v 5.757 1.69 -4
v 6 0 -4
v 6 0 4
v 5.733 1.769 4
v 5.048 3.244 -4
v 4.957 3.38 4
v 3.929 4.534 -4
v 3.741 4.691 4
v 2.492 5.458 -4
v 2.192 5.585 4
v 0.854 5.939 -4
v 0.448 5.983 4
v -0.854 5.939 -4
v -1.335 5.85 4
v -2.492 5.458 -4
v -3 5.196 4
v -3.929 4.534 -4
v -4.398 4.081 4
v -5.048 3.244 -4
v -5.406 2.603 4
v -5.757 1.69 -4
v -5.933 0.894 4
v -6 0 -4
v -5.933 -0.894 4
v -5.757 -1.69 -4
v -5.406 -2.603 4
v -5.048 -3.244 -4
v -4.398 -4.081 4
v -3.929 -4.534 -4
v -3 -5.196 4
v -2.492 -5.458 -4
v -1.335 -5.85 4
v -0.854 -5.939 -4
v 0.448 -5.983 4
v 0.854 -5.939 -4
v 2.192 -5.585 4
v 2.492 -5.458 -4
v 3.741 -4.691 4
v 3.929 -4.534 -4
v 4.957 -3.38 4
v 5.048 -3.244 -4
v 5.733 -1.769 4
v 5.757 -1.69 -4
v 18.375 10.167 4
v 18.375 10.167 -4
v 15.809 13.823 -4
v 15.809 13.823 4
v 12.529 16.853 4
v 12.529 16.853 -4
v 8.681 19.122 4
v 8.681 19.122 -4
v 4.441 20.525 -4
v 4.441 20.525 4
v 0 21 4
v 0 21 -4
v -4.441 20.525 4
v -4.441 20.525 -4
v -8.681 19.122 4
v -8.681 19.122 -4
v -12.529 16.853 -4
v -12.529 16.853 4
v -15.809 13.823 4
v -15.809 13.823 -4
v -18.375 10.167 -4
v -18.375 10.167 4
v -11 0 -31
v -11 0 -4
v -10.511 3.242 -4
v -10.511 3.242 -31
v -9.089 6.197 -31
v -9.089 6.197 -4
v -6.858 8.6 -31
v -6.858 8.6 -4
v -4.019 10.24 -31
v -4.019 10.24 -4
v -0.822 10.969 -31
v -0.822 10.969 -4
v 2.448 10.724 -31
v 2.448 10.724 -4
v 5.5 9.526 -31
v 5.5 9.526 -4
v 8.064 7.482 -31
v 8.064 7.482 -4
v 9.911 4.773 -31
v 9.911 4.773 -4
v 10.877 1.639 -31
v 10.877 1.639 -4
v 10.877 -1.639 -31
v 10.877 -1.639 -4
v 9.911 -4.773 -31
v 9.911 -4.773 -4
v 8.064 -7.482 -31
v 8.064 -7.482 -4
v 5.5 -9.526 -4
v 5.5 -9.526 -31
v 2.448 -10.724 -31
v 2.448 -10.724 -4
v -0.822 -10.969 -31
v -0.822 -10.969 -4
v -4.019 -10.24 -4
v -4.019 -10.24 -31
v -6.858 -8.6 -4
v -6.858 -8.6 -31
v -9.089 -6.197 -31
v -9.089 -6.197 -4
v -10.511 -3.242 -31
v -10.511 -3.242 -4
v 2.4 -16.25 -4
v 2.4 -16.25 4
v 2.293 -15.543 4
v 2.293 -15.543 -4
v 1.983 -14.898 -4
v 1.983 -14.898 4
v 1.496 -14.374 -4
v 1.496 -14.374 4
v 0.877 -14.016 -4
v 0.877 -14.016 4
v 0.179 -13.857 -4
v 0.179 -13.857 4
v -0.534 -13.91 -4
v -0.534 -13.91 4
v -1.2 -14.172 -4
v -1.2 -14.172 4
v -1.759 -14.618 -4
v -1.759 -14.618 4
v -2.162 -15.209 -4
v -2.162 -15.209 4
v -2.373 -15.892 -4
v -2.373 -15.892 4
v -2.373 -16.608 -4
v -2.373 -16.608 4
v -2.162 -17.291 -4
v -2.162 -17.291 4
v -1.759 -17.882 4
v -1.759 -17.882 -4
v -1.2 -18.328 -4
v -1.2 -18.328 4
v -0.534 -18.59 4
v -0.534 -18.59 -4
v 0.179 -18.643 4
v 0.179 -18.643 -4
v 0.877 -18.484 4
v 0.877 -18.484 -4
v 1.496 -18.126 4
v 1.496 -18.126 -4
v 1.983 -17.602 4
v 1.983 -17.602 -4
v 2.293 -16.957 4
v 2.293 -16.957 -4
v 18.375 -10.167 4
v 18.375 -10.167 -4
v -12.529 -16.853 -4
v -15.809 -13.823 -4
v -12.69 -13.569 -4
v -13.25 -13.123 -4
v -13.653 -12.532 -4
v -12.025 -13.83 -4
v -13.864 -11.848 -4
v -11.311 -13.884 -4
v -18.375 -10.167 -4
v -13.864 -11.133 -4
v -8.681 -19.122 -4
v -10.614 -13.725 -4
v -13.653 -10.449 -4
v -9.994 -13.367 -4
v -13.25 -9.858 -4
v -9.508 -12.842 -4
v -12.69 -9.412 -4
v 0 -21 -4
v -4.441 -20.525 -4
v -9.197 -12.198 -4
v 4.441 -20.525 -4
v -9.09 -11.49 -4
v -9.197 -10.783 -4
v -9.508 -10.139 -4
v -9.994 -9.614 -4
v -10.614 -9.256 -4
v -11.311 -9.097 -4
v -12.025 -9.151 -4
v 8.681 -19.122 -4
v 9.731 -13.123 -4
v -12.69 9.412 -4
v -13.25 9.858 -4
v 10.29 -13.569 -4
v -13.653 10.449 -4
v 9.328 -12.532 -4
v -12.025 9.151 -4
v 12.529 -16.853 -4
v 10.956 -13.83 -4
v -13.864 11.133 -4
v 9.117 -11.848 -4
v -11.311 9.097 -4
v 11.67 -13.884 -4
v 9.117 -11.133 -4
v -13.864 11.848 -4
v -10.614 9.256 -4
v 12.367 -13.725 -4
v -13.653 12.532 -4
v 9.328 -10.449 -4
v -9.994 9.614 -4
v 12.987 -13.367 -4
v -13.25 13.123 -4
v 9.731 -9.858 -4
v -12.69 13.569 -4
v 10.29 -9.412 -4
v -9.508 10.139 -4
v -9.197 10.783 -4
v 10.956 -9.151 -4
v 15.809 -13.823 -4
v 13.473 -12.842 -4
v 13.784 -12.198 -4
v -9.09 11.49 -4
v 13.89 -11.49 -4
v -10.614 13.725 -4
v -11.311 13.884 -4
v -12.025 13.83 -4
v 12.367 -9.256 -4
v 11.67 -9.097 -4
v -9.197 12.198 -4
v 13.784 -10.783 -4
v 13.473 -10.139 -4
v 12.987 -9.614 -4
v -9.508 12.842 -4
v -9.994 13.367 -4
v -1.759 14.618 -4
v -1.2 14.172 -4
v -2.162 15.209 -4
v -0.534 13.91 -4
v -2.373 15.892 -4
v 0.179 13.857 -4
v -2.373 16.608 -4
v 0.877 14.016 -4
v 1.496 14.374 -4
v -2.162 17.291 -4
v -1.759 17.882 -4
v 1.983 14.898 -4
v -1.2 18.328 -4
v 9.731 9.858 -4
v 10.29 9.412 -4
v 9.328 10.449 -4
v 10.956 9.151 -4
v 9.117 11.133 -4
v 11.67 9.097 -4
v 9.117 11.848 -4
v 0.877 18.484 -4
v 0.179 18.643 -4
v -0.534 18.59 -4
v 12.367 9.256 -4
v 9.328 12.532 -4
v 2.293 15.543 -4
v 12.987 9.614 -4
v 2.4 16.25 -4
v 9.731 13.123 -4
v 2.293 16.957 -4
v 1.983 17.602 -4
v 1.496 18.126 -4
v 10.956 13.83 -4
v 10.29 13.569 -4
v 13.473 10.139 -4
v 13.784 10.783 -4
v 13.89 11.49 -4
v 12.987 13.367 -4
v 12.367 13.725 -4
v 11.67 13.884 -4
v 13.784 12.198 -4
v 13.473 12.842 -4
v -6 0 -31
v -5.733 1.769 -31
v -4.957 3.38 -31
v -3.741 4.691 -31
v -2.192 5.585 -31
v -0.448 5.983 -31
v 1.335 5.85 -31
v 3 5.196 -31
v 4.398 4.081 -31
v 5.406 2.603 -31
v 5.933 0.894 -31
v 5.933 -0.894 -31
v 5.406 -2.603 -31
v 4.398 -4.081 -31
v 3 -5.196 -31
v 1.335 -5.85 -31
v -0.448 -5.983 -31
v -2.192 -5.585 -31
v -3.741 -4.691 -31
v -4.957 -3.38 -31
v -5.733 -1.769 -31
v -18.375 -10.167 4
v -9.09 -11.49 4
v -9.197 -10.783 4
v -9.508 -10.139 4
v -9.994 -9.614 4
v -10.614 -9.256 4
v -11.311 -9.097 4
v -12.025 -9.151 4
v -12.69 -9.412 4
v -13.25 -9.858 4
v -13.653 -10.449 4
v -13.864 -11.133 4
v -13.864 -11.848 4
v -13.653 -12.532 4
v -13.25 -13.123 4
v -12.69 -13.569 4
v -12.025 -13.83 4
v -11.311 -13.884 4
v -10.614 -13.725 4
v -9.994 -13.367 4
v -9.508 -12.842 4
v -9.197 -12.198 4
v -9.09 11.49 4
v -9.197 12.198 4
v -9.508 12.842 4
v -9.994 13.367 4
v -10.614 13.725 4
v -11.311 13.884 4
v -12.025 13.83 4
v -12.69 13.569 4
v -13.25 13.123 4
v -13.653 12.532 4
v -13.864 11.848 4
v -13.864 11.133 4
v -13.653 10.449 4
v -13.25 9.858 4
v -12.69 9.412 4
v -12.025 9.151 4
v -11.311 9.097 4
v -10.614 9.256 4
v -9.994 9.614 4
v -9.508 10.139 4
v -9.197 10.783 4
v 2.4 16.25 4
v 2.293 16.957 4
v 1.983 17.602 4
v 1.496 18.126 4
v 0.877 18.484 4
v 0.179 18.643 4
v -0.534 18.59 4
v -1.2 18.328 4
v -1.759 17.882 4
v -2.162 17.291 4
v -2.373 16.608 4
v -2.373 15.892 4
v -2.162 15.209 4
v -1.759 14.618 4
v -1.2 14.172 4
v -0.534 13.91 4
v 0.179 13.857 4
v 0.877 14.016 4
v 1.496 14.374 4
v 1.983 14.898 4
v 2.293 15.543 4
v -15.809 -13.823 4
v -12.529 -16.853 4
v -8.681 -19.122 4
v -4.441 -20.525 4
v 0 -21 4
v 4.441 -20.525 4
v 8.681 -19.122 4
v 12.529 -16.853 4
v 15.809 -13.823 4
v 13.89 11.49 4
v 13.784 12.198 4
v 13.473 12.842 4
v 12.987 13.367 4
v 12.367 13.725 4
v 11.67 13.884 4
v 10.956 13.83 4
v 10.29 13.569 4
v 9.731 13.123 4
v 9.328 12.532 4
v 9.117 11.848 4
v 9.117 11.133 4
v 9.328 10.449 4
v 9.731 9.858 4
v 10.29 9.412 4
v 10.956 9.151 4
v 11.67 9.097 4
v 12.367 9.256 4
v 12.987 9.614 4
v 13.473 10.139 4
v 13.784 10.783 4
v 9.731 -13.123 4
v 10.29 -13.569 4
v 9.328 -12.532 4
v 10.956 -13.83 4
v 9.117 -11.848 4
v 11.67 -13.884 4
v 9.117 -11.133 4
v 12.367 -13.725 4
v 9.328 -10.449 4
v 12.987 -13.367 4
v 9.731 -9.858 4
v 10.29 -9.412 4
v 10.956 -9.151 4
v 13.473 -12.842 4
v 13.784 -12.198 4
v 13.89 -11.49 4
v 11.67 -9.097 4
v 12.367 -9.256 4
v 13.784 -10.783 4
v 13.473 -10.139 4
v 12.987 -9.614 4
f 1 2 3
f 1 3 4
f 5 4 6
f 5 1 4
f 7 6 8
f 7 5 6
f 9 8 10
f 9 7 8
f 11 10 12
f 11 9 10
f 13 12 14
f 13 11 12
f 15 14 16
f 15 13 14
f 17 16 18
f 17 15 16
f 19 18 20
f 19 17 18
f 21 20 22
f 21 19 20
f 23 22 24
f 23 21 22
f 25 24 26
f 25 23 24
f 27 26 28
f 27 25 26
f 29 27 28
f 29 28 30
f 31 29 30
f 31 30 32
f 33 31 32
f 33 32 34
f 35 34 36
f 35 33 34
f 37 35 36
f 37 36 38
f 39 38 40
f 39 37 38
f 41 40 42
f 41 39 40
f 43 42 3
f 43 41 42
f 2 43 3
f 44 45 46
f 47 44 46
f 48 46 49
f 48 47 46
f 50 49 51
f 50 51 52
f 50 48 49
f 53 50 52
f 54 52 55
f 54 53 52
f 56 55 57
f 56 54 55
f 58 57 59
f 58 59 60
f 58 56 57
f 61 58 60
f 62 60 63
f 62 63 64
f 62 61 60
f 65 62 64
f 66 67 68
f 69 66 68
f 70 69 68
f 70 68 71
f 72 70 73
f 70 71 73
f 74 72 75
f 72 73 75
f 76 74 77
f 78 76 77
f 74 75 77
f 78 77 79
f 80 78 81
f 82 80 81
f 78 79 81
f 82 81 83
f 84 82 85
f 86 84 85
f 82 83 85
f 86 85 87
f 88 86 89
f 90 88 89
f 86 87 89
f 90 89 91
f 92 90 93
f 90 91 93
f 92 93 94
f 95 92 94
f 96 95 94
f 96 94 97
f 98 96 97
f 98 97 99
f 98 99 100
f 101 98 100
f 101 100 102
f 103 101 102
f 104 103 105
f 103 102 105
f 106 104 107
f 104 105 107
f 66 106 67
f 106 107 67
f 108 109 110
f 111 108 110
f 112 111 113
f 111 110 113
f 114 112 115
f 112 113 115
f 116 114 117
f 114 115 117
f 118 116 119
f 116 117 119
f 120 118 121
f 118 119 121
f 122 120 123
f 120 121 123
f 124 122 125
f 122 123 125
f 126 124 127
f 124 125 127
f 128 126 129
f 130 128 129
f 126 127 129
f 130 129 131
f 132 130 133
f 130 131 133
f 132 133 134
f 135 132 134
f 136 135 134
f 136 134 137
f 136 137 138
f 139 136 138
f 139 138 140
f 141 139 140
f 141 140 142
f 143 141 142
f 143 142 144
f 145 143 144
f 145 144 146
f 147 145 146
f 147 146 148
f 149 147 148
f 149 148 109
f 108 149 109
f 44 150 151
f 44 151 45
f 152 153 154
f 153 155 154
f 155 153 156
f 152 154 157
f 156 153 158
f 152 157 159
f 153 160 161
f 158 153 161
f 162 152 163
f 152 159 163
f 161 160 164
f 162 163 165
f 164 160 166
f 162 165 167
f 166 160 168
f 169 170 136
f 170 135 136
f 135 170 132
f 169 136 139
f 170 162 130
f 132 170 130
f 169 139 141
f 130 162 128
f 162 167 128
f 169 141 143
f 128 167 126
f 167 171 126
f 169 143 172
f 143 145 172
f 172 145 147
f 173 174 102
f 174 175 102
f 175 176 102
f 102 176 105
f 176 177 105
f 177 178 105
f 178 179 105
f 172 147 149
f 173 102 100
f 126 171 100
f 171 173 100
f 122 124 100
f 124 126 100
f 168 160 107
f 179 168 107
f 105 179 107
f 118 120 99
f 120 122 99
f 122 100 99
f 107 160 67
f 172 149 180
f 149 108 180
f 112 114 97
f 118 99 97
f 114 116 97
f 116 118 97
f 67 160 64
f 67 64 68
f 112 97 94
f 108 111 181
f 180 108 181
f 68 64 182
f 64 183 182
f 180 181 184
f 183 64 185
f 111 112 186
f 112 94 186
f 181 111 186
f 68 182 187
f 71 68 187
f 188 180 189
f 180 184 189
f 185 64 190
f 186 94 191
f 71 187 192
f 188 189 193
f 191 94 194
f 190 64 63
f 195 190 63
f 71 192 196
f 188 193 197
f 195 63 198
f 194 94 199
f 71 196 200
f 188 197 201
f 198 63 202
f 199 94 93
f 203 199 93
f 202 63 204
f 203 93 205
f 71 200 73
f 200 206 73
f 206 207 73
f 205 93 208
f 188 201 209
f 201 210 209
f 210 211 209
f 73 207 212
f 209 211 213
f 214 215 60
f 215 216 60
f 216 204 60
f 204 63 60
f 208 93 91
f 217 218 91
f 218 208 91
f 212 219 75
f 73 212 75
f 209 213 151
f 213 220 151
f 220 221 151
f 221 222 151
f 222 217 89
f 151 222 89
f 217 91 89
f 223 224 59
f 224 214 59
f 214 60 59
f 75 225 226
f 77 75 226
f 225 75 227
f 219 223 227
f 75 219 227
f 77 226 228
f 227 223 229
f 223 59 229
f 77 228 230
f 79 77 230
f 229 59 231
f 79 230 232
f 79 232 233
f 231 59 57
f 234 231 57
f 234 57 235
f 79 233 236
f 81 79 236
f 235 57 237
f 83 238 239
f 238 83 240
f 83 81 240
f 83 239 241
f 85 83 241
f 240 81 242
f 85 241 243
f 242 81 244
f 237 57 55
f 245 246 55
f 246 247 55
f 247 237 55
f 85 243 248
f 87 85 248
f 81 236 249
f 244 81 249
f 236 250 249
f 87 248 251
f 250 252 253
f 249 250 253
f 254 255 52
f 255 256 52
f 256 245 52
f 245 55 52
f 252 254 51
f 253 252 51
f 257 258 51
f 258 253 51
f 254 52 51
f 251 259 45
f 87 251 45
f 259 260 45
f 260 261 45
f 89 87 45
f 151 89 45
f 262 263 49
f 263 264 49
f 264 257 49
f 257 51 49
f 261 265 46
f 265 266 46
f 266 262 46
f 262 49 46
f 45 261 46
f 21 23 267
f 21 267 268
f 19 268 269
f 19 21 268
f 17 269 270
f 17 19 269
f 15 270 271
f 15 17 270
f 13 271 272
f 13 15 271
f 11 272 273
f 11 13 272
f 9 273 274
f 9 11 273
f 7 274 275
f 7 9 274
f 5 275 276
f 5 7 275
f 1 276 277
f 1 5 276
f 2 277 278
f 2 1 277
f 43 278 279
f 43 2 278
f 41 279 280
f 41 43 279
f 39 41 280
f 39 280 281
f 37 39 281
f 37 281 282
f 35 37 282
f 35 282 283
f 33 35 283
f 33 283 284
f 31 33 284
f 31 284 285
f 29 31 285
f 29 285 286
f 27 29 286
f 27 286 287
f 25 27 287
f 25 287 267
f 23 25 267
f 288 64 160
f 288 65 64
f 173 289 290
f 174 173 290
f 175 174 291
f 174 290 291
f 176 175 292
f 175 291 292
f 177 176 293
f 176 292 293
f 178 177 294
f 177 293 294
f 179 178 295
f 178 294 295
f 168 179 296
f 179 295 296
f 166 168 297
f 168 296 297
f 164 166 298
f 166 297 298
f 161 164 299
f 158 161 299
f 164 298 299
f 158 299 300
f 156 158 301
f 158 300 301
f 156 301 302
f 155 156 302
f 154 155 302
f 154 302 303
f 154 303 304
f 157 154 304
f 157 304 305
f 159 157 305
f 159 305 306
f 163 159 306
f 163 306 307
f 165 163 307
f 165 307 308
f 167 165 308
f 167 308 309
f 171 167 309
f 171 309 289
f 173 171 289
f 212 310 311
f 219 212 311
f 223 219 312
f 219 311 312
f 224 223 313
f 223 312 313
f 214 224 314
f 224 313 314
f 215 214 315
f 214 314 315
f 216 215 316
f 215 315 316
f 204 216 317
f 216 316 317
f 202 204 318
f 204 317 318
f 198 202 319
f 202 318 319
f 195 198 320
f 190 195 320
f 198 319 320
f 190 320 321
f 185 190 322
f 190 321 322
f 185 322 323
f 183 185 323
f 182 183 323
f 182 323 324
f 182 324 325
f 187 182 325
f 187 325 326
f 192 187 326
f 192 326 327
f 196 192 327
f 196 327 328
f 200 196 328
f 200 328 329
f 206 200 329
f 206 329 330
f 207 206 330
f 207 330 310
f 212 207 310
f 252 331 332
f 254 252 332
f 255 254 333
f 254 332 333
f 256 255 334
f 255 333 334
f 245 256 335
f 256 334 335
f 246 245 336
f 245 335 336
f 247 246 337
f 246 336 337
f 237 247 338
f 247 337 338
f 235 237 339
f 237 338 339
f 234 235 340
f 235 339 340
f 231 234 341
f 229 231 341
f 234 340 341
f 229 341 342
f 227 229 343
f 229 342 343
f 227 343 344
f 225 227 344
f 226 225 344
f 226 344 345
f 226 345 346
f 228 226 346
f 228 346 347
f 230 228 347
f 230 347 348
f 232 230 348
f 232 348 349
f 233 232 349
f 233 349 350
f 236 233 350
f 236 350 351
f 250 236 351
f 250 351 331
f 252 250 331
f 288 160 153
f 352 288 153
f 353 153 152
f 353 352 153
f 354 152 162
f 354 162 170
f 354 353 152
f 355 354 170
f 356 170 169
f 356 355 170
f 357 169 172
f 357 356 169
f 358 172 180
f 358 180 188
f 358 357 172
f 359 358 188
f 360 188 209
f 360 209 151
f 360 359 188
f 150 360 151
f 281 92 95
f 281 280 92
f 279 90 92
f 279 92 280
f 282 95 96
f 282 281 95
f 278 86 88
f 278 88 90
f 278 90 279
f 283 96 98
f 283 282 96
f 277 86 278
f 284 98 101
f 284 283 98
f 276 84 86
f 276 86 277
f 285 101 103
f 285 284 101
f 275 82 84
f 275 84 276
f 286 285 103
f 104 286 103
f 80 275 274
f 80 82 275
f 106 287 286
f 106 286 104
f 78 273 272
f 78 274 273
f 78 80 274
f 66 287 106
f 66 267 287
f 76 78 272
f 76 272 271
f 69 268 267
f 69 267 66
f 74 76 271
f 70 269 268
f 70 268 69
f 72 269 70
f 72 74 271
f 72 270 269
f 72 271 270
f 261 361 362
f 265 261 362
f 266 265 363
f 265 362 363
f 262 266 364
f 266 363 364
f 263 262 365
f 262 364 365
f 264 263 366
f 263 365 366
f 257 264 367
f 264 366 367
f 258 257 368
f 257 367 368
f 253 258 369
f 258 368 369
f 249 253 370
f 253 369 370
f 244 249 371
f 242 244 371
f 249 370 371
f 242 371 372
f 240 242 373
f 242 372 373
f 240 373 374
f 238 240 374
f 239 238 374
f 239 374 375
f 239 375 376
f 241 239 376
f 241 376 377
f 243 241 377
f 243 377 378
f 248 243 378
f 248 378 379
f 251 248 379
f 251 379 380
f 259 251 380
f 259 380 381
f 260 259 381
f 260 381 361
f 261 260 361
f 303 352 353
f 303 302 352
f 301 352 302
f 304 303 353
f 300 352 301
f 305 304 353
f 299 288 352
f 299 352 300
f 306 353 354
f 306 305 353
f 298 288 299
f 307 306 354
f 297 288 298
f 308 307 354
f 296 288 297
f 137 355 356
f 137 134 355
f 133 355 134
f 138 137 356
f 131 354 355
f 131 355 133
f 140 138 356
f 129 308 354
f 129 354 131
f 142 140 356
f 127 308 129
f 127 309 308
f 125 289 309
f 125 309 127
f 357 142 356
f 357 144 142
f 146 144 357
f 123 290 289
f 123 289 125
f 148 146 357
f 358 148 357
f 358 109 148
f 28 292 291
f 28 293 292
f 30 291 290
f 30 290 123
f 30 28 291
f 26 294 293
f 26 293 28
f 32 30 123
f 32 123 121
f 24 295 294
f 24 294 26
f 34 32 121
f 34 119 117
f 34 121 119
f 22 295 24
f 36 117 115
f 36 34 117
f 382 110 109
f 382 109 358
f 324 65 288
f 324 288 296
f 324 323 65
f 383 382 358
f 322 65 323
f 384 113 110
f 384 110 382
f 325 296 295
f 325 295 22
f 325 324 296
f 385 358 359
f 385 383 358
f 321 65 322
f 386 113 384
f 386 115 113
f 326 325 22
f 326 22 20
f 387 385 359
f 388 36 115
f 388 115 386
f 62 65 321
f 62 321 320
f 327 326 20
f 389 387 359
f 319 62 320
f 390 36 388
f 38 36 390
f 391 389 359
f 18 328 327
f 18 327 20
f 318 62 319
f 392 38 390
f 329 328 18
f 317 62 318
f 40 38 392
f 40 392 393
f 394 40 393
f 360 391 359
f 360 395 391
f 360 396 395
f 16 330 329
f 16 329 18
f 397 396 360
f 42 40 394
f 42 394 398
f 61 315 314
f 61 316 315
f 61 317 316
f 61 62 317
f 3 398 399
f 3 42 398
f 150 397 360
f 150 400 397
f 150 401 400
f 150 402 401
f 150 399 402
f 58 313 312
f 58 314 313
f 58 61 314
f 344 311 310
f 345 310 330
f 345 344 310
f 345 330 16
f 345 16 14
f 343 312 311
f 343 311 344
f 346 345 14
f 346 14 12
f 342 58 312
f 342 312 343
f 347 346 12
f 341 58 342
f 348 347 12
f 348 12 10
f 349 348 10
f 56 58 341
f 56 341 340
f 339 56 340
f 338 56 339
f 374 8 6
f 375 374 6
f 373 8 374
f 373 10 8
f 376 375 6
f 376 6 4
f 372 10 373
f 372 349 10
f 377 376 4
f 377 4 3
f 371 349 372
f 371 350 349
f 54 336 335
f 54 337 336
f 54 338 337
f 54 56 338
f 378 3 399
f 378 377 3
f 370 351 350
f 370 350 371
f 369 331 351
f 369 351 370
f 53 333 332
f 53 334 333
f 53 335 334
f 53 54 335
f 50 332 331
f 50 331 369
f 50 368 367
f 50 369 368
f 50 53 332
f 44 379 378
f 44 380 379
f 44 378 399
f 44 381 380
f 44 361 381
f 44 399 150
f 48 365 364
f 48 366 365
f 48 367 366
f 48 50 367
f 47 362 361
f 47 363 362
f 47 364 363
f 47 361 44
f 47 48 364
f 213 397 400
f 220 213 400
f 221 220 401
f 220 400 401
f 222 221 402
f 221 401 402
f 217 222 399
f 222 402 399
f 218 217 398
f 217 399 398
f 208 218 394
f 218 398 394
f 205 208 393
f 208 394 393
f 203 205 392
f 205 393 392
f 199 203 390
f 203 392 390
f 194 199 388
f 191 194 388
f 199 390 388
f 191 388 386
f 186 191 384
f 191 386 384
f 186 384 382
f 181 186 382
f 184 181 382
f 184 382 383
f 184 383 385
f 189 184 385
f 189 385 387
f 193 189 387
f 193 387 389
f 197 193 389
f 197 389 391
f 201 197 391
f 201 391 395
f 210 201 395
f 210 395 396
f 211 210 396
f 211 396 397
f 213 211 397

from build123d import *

# Parameters (mm, degrees)
SKETCH1_R           = 6
BOSS_EXTRUDE1_DEPTH = 4
SKETCH2_R           = 2.4
CUT_EXTRUDE1_DEPTH  = 9
SKETCH3_R           = 11
SKETCH3_R_2         = 6
BOSS_EXTRUDE2_DEPTH = 27


with BuildPart() as part:
    # Sketch1 → Boss-Extrude1 (new body, symmetric)
    with BuildSketch(Plane.XY):
        with BuildLine():
            Line((-18.375, 10.166581284), (-18.375, -10.166581284))
            ThreePointArc((-18.375, -10.166581284), (0, -21), (18.375, -10.166581284))
            Line((18.375, -10.166581284), (18.375, 10.166581284))
            ThreePointArc((18.375, 10.166581284), (0, 21), (-18.375, 10.166581284))
        make_face()
        Circle(SKETCH1_R, mode=Mode.SUBTRACT)
    extrude(amount=BOSS_EXTRUDE1_DEPTH, both=True)

    # Sketch2 → Cut-Extrude1 (cut, through all)
    with BuildSketch(Plane.XY.offset(4)):
        with Locations((-11.490485194, 11.490485194)):
            Circle(SKETCH2_R)
        with Locations((0, 16.25)):
            Circle(SKETCH2_R)
        with Locations((11.490485194, 11.490485194)):
            Circle(SKETCH2_R)
        with Locations((11.490485194, -11.490485194)):
            Circle(SKETCH2_R)
        with Locations((0, -16.25)):
            Circle(SKETCH2_R)
        with Locations((-11.490485194, -11.490485194)):
            Circle(SKETCH2_R)
    extrude(amount=-CUT_EXTRUDE1_DEPTH, mode=Mode.SUBTRACT)

    # Sketch3 → Boss-Extrude2 (add)
    with BuildSketch(Plane(origin=(0, 0, -4), x_dir=(-1, 0, 0), z_dir=(0, 0, -1))):
        Circle(SKETCH3_R)
        Circle(SKETCH3_R_2, mode=Mode.SUBTRACT)
    extrude(amount=BOSS_EXTRUDE2_DEPTH)


solid = part.part
